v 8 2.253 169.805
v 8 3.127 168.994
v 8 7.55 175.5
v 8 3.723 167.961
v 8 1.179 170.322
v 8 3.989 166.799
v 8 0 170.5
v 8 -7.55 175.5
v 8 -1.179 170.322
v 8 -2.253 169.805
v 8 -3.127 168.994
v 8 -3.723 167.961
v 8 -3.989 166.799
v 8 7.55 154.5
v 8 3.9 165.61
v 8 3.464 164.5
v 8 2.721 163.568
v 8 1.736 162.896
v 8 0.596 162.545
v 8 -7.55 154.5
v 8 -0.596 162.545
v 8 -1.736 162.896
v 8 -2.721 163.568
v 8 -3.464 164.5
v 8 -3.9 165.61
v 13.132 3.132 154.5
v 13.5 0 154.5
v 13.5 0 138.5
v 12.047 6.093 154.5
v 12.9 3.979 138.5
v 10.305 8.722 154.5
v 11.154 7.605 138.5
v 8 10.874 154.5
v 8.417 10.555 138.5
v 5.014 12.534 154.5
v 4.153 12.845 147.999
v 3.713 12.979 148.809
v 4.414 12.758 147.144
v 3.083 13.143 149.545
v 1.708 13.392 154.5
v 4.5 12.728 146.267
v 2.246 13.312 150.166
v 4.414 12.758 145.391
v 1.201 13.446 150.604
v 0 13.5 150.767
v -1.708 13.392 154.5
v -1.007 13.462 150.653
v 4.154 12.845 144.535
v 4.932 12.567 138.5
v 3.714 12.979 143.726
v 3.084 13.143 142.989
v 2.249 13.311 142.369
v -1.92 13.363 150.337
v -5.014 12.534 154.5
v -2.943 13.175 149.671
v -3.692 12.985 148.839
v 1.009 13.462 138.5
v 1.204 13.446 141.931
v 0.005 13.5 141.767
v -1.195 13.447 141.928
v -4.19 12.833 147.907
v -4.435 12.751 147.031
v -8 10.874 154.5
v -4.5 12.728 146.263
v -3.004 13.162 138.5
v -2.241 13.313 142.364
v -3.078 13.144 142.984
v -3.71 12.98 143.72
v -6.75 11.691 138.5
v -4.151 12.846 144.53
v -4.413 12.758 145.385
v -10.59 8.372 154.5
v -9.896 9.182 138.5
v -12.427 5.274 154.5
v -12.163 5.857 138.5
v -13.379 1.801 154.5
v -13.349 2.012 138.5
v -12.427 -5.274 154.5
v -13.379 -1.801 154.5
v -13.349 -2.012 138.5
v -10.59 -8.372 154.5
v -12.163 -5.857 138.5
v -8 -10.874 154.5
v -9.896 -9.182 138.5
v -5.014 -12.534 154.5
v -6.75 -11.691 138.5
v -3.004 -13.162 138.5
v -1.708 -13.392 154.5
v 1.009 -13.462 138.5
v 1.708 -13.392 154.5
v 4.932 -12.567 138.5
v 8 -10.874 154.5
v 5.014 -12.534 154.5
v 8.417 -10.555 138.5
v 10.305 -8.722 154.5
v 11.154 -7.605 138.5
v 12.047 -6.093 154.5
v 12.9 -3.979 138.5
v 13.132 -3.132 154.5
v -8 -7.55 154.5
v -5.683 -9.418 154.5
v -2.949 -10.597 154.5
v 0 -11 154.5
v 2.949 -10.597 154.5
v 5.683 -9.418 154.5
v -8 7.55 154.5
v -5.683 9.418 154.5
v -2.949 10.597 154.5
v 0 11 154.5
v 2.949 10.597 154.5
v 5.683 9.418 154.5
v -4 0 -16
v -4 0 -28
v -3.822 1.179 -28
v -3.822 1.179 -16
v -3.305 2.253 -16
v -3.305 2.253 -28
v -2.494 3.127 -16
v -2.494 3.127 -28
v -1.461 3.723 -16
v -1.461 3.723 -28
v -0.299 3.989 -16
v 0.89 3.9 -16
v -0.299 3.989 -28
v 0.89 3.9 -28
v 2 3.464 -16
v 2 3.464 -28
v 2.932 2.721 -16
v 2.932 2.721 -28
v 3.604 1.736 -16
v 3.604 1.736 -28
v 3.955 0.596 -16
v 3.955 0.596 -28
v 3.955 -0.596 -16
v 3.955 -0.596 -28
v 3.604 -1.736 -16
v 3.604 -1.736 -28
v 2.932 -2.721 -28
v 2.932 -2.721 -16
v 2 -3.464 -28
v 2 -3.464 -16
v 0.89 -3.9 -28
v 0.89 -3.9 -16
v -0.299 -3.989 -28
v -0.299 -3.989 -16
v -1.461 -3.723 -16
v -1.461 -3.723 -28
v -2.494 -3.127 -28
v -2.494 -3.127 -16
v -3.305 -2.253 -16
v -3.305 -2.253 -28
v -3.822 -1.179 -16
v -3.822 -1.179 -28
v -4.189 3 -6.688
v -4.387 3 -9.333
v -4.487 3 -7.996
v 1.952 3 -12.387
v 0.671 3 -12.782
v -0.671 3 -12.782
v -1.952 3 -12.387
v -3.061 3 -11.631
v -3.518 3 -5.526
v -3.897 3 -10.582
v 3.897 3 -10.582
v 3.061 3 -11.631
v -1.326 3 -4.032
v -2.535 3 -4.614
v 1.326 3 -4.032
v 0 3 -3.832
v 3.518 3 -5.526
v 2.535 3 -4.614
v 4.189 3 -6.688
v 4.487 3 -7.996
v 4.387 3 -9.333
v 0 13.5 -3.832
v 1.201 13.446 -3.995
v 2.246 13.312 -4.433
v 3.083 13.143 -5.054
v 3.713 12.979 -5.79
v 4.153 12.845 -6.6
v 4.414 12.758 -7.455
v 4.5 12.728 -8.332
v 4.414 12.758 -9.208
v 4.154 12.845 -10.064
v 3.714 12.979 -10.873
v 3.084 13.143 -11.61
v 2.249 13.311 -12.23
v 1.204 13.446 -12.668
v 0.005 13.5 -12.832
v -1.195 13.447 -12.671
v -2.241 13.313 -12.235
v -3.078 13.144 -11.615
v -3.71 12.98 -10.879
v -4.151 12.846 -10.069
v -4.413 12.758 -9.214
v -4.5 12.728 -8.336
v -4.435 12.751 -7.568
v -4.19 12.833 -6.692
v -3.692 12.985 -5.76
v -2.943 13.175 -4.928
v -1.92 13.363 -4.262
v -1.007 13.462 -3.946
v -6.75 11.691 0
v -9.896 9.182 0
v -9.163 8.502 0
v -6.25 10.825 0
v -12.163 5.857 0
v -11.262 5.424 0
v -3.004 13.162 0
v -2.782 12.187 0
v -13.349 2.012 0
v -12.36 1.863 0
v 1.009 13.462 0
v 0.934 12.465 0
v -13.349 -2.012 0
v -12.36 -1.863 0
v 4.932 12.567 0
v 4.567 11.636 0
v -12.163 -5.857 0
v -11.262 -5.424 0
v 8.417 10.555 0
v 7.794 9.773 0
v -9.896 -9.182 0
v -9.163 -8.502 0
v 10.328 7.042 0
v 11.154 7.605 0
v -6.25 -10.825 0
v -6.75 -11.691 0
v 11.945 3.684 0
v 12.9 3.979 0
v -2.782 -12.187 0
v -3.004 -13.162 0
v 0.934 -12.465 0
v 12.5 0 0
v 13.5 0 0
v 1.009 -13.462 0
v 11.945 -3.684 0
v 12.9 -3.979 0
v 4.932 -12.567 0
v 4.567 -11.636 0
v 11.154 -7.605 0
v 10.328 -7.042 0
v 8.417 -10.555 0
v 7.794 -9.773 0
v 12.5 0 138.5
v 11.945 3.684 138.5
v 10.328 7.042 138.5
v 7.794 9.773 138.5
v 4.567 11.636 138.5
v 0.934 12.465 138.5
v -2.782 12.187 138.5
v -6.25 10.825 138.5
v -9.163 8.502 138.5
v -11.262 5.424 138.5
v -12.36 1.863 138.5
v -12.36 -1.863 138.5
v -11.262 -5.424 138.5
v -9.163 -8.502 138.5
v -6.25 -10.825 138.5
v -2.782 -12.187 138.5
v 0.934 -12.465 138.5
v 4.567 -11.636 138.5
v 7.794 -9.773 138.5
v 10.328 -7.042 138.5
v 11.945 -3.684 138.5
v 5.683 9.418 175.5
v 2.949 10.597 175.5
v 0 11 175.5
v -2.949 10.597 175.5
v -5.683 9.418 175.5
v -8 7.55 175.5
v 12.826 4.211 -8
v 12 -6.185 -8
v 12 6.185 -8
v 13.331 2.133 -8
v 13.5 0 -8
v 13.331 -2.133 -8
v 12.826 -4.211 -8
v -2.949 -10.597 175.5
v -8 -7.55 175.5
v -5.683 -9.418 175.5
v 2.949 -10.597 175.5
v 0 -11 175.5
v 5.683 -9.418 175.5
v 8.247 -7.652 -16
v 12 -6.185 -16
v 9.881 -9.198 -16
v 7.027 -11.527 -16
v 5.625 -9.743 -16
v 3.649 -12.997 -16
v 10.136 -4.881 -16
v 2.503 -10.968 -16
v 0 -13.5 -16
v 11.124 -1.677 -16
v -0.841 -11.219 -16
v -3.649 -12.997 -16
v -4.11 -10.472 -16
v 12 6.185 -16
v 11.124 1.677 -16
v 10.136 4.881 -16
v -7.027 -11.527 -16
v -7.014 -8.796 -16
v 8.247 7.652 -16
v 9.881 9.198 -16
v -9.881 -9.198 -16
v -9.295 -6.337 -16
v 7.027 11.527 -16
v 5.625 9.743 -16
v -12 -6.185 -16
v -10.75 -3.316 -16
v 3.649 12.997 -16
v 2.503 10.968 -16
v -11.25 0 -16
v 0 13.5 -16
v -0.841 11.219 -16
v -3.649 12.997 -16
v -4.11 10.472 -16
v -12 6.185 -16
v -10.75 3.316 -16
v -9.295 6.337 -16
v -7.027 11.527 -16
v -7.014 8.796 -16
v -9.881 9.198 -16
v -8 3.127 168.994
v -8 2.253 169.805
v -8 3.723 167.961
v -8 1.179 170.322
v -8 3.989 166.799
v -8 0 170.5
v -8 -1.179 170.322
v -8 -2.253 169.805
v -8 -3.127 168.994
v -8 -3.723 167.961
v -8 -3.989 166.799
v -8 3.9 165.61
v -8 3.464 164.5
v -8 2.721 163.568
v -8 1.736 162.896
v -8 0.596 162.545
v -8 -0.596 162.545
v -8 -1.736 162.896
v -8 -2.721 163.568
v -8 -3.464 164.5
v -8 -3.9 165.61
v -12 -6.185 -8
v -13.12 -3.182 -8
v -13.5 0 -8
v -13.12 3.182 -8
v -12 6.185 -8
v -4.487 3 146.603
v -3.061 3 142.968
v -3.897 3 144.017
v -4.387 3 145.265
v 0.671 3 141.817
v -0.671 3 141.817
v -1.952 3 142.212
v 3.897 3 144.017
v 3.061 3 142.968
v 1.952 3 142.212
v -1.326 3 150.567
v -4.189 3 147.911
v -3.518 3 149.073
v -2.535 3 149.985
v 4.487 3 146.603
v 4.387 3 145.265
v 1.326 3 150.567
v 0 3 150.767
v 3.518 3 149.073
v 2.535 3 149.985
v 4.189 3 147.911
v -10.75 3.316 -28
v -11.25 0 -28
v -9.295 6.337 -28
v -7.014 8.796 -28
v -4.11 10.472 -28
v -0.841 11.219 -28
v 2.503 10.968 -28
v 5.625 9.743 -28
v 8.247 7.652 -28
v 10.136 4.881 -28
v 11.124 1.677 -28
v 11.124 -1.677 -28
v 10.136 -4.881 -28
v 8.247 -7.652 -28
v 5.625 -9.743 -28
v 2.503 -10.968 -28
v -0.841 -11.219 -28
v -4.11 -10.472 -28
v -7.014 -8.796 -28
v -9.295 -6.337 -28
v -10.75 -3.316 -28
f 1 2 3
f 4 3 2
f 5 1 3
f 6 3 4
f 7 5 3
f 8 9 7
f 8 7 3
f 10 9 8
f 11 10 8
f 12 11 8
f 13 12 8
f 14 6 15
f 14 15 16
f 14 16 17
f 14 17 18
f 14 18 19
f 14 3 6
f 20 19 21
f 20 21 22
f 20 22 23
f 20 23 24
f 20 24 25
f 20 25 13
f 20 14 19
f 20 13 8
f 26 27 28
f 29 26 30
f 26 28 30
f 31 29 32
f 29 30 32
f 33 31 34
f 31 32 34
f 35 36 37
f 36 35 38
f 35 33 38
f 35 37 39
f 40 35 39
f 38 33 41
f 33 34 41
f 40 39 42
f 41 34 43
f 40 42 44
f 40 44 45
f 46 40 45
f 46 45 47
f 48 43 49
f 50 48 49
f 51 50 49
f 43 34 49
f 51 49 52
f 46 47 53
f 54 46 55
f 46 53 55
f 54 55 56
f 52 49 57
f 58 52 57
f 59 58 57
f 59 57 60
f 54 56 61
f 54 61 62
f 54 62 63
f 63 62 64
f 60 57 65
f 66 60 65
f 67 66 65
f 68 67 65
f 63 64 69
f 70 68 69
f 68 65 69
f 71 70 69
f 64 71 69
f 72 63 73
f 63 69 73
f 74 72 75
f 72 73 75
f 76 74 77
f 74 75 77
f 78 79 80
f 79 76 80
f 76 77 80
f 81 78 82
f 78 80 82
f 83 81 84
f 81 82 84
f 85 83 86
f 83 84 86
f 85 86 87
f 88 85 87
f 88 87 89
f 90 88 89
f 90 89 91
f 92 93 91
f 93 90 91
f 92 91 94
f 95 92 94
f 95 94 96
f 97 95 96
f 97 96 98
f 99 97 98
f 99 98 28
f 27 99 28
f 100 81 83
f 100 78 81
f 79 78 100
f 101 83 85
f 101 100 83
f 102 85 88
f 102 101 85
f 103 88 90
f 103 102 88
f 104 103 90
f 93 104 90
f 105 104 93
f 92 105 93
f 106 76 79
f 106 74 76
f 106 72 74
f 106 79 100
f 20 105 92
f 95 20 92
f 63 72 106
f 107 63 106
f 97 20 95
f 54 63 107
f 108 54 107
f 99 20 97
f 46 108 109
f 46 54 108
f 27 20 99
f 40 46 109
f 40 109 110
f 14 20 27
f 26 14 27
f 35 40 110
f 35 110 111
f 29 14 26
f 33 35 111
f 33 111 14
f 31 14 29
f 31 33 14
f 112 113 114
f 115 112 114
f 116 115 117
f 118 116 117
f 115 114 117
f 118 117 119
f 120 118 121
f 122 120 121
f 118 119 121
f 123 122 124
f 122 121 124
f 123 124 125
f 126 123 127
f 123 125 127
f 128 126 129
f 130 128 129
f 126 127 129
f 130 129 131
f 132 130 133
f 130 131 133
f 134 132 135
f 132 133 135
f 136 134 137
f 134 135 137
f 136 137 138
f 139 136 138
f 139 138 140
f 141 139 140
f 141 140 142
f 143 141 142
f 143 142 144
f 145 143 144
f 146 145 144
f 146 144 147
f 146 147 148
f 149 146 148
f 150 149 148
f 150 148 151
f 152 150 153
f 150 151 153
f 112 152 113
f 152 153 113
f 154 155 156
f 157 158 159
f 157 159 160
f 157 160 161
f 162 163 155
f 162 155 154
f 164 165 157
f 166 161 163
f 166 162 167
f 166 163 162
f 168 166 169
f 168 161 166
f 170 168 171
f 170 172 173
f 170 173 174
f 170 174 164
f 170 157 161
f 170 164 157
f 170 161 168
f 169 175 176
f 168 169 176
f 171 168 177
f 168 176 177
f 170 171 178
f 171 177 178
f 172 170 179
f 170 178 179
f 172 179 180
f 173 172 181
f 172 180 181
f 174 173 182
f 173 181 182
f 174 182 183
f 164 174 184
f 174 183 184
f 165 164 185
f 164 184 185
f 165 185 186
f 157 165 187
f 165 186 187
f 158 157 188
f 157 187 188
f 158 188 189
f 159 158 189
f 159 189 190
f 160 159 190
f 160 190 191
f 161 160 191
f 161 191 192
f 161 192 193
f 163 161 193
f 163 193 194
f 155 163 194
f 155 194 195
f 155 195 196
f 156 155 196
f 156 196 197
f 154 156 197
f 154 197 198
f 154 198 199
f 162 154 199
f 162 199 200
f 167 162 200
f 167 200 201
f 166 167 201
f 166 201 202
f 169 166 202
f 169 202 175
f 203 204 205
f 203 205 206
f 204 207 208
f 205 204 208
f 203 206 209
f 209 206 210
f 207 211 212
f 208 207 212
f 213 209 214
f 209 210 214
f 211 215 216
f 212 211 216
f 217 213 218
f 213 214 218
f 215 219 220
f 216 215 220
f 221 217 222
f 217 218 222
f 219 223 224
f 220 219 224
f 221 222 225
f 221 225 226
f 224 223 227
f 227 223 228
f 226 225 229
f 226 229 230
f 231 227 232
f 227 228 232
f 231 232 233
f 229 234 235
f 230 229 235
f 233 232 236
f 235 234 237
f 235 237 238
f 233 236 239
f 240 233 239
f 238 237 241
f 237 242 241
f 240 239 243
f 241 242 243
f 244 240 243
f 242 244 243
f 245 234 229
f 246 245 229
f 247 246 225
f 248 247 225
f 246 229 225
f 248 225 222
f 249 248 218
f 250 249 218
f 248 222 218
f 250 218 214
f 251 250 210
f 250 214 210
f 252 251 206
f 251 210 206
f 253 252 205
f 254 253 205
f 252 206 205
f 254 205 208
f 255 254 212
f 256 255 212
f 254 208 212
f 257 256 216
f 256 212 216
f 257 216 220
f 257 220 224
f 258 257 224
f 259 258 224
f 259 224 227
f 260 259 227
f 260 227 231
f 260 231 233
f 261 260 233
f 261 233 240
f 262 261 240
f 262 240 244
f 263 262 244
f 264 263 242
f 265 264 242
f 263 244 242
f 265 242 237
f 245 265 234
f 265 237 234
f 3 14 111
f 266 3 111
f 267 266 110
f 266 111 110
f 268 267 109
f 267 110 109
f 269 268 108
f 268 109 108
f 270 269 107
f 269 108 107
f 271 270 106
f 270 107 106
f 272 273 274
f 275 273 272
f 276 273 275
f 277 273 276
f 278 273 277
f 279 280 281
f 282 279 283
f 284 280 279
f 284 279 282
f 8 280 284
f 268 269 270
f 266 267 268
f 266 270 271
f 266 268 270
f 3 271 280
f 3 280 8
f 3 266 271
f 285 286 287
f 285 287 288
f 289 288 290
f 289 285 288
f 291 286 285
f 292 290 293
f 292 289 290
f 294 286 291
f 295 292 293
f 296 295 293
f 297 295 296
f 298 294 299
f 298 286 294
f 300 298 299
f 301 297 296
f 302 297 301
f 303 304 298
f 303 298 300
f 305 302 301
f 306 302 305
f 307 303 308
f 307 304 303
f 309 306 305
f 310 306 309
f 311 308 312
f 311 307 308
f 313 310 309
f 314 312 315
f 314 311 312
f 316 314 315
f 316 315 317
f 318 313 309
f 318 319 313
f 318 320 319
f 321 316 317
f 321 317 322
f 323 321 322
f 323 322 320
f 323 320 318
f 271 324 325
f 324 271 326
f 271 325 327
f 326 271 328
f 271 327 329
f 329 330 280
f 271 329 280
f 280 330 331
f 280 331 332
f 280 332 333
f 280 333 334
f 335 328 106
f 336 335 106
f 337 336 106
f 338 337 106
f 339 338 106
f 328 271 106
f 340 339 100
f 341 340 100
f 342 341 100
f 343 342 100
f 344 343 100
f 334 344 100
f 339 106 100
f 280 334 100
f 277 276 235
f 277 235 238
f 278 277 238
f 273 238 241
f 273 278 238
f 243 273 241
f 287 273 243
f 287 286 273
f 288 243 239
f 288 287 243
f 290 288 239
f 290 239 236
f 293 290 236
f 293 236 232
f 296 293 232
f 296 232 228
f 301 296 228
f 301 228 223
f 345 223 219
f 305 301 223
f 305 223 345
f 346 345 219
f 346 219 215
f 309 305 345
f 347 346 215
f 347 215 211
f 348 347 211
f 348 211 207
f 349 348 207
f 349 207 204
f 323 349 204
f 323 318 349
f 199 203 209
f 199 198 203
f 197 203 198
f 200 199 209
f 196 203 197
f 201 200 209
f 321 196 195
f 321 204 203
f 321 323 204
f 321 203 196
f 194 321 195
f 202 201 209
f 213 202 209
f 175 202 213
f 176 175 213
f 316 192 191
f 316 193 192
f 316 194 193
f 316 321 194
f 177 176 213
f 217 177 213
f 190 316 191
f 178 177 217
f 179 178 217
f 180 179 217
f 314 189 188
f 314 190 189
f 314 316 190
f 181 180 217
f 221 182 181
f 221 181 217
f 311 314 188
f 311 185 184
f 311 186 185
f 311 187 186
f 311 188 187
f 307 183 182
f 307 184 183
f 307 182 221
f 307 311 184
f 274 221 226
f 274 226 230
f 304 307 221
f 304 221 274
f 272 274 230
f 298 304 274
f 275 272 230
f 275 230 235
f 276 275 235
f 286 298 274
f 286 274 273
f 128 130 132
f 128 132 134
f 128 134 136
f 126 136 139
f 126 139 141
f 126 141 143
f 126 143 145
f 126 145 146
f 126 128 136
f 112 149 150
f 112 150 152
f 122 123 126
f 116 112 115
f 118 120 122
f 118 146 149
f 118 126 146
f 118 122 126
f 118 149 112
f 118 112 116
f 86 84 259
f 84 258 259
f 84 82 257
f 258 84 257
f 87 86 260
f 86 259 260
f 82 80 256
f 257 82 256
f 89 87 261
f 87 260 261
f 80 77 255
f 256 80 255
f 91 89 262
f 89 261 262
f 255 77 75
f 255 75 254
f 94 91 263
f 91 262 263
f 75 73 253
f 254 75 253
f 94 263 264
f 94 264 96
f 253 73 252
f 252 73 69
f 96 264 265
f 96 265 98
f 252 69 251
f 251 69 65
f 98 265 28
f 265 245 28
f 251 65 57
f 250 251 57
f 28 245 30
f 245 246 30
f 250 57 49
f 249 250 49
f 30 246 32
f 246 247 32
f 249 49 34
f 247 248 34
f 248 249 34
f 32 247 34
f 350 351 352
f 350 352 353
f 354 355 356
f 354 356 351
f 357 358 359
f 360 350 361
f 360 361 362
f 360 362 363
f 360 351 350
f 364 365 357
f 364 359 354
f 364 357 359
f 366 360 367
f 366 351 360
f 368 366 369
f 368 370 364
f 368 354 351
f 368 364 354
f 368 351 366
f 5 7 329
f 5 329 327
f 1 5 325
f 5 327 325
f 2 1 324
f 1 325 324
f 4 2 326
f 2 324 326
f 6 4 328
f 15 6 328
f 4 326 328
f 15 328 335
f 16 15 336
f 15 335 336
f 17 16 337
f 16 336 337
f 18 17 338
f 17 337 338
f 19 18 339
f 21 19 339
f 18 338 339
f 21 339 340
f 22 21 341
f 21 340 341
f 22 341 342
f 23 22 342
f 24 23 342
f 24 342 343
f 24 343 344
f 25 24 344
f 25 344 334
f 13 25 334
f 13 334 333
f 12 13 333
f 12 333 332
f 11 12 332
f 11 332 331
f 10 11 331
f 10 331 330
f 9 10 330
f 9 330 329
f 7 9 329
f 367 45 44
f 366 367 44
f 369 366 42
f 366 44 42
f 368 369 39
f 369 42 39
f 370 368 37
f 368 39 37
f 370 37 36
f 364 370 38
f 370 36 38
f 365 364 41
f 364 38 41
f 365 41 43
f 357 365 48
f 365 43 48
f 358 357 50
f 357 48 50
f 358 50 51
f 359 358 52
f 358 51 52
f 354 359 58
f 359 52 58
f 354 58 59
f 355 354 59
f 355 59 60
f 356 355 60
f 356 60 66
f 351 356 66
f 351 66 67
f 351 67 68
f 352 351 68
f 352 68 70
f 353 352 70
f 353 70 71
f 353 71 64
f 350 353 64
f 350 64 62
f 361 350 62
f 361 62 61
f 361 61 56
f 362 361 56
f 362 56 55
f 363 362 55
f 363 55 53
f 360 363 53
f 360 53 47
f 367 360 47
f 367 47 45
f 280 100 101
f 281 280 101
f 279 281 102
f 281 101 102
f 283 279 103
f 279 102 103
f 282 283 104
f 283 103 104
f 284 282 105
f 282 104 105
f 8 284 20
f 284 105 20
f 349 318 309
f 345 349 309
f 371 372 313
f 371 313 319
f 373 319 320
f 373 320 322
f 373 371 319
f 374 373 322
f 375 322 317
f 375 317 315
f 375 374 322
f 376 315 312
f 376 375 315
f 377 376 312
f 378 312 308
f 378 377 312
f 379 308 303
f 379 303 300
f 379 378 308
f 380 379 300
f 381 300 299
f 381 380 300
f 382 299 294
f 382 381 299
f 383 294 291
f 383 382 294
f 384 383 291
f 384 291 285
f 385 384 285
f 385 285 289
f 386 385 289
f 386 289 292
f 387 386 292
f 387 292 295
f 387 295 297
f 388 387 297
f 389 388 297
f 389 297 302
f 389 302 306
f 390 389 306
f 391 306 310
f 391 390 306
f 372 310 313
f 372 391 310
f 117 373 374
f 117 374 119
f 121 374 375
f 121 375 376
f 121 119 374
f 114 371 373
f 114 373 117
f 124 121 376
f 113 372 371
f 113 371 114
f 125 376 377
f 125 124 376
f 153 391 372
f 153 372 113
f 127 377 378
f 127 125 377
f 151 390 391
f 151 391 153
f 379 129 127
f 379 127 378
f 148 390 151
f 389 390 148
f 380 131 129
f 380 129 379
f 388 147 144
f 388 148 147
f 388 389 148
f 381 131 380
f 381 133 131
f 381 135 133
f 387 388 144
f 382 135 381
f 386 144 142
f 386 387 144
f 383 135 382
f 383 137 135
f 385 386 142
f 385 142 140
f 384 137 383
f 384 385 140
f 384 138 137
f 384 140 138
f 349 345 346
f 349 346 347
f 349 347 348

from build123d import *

# Parameters (mm, degrees)
SKETCH1_R           = 12.5
BOSS_EXTRUDE1_DEPTH = 138.5
SKETCH2_R           = 13.5
BOSS_EXTRUDE2_DEPTH = 37
BOSS_EXTRUDE3_START = 28
SKETCH3_R           = 13.5
BOSS_EXTRUDE3_DEPTH = 28
CUT_EXTRUDE1_START  = -21
CUT_EXTRUDE1_DEPTH  = 21
SKETCH5_R           = 4
CUT_EXTRUDE2_DEPTH  = 178.32667594
CUT_EXTRUDE4_START  = -21
CUT_EXTRUDE4_DEPTH  = 21
CUT_EXTRUDE5_DEPTH  = 20
SKETCH8_OUTSIDE_W   = 70.41
SKETCH8_OUTSIDE_H   = 70.41
SKETCH8_OUTSIDE_R   = 11.25
CUT_EXTRUDE6_DEPTH  = 12
SKETCH10_R          = 4.5
CUT_EXTRUDE7_DEPTH  = 12
SKETCH11_R          = 4
CUT_EXTRUDE8_DEPTH  = 12


with BuildPart() as part:
    # Sketch1 → Boss-Extrude1 (new body)
    with BuildSketch(Plane.XY):
        Circle(SKETCH1_R)
    extrude(amount=BOSS_EXTRUDE1_DEPTH)

    # Sketch2 → Boss-Extrude2 (add)
    with BuildSketch(Plane.XY.offset(138.5)):
        Circle(SKETCH2_R)
    extrude(amount=BOSS_EXTRUDE2_DEPTH)

    # Sketch3 → Boss-Extrude3 (add)
    with BuildSketch(Plane(origin=(0, 0, 0), x_dir=(-1, 0, 0), z_dir=(0, 0, -1)).offset(BOSS_EXTRUDE3_START)):
        with Locations(Location((0, 0, 0), (0, 0, 180))):
            Circle(SKETCH3_R)
    extrude(amount=-BOSS_EXTRUDE3_DEPTH)

    # Sketch4 → Cut-Extrude1 (cut)
    with BuildSketch(Plane.XY.offset(175.5).offset(CUT_EXTRUDE1_START)):
        with BuildLine():
            Line((-8, 10.874281585), (-8, -10.874281585))
            ThreePointArc((-8, -10.874281585), (-13.5, 0), (-8, 10.874281585))
        make_face()
        with BuildLine():
            Line((8, 10.874281585), (8, -10.874281585))
            ThreePointArc((8, -10.874281585), (13.5, 0), (8, 10.874281585))
        make_face()
    extrude(amount=CUT_EXTRUDE1_DEPTH, mode=Mode.SUBTRACT)

    # Sketch5 → Cut-Extrude2 (cut, through all)
    with BuildSketch(Plane.ZY.offset(8)):
        with Locations((166.5, 0)):
            Circle(SKETCH5_R)
    extrude(amount=-CUT_EXTRUDE2_DEPTH, mode=Mode.SUBTRACT)

    # Sketch6 → Cut-Extrude4 (cut)
    with BuildSketch(Plane.XY.offset(175.5).offset(CUT_EXTRUDE4_START)):
        with BuildLine():
            Line((8, 10.874281585), (8, 7.549834435))
            ThreePointArc((8, 7.549834435), (0, 11), (-8, 7.549834435))
            Line((-8, 7.549834435), (-8, 10.874281585))
            ThreePointArc((-8, 10.874281585), (0, 13.5), (8, 10.874281585))
        make_face()
        with BuildLine():
            Line((-8, -10.874281585), (-8, -7.549834435))
            ThreePointArc((-8, -7.549834435), (0, -11), (8, -7.549834435))
            Line((8, -7.549834435), (8, -10.874281585))
            ThreePointArc((8, -10.874281585), (0, -13.5), (-8, -10.874281585))
        make_face()
    extrude(amount=CUT_EXTRUDE4_DEPTH, mode=Mode.SUBTRACT)

    # Sketch7 → Cut-Extrude5 (cut)
    with BuildSketch(Plane(origin=(0, 0, -28), x_dir=(-1, 0, 0), z_dir=(0, 0, -1))):
        with BuildLine():
            Line((-12, 6.184658438), (-12, -6.184658438))
            ThreePointArc((-12, -6.184658438), (-13.5, 0), (-12, 6.184658438))
        make_face()
        with BuildLine():
            Line((12, 6.184658438), (12, -6.184658438))
            ThreePointArc((12, -6.184658438), (13.5, 0), (12, 6.184658438))
        make_face()
    extrude(amount=-CUT_EXTRUDE5_DEPTH, mode=Mode.SUBTRACT)

    # Sketch8 outside → Cut-Extrude6 (cut)
    with BuildSketch(Plane(origin=(0, 0, -28), x_dir=(-1, 0, 0), z_dir=(0, 0, -1))):
        Rectangle(SKETCH8_OUTSIDE_W, SKETCH8_OUTSIDE_H)
        Circle(SKETCH8_OUTSIDE_R, mode=Mode.SUBTRACT)
    extrude(amount=-CUT_EXTRUDE6_DEPTH, mode=Mode.SUBTRACT)

    # Sketch10 → Cut-Extrude7 (cut)
    with BuildSketch(Plane(origin=(0, 15, 0), x_dir=(-1, 0, 0), z_dir=(0, 1, 0))):
        with Locations(Location((0, 146.266828113, 0), (0, 0, 90))):
            Circle(SKETCH10_R)
        with Locations(Location((0, -8.332143665, 0), (0, 0, 90))):
            Circle(SKETCH10_R)
    extrude(amount=-CUT_EXTRUDE7_DEPTH, mode=Mode.SUBTRACT)

    # Sketch11 → Cut-Extrude8 (cut)
    with BuildSketch(Plane(origin=(0, 0, -28), x_dir=(-1, 0, 0), z_dir=(0, 0, -1))):
        Circle(SKETCH11_R)
    extrude(amount=-CUT_EXTRUDE8_DEPTH, mode=Mode.SUBTRACT)


solid = part.part
